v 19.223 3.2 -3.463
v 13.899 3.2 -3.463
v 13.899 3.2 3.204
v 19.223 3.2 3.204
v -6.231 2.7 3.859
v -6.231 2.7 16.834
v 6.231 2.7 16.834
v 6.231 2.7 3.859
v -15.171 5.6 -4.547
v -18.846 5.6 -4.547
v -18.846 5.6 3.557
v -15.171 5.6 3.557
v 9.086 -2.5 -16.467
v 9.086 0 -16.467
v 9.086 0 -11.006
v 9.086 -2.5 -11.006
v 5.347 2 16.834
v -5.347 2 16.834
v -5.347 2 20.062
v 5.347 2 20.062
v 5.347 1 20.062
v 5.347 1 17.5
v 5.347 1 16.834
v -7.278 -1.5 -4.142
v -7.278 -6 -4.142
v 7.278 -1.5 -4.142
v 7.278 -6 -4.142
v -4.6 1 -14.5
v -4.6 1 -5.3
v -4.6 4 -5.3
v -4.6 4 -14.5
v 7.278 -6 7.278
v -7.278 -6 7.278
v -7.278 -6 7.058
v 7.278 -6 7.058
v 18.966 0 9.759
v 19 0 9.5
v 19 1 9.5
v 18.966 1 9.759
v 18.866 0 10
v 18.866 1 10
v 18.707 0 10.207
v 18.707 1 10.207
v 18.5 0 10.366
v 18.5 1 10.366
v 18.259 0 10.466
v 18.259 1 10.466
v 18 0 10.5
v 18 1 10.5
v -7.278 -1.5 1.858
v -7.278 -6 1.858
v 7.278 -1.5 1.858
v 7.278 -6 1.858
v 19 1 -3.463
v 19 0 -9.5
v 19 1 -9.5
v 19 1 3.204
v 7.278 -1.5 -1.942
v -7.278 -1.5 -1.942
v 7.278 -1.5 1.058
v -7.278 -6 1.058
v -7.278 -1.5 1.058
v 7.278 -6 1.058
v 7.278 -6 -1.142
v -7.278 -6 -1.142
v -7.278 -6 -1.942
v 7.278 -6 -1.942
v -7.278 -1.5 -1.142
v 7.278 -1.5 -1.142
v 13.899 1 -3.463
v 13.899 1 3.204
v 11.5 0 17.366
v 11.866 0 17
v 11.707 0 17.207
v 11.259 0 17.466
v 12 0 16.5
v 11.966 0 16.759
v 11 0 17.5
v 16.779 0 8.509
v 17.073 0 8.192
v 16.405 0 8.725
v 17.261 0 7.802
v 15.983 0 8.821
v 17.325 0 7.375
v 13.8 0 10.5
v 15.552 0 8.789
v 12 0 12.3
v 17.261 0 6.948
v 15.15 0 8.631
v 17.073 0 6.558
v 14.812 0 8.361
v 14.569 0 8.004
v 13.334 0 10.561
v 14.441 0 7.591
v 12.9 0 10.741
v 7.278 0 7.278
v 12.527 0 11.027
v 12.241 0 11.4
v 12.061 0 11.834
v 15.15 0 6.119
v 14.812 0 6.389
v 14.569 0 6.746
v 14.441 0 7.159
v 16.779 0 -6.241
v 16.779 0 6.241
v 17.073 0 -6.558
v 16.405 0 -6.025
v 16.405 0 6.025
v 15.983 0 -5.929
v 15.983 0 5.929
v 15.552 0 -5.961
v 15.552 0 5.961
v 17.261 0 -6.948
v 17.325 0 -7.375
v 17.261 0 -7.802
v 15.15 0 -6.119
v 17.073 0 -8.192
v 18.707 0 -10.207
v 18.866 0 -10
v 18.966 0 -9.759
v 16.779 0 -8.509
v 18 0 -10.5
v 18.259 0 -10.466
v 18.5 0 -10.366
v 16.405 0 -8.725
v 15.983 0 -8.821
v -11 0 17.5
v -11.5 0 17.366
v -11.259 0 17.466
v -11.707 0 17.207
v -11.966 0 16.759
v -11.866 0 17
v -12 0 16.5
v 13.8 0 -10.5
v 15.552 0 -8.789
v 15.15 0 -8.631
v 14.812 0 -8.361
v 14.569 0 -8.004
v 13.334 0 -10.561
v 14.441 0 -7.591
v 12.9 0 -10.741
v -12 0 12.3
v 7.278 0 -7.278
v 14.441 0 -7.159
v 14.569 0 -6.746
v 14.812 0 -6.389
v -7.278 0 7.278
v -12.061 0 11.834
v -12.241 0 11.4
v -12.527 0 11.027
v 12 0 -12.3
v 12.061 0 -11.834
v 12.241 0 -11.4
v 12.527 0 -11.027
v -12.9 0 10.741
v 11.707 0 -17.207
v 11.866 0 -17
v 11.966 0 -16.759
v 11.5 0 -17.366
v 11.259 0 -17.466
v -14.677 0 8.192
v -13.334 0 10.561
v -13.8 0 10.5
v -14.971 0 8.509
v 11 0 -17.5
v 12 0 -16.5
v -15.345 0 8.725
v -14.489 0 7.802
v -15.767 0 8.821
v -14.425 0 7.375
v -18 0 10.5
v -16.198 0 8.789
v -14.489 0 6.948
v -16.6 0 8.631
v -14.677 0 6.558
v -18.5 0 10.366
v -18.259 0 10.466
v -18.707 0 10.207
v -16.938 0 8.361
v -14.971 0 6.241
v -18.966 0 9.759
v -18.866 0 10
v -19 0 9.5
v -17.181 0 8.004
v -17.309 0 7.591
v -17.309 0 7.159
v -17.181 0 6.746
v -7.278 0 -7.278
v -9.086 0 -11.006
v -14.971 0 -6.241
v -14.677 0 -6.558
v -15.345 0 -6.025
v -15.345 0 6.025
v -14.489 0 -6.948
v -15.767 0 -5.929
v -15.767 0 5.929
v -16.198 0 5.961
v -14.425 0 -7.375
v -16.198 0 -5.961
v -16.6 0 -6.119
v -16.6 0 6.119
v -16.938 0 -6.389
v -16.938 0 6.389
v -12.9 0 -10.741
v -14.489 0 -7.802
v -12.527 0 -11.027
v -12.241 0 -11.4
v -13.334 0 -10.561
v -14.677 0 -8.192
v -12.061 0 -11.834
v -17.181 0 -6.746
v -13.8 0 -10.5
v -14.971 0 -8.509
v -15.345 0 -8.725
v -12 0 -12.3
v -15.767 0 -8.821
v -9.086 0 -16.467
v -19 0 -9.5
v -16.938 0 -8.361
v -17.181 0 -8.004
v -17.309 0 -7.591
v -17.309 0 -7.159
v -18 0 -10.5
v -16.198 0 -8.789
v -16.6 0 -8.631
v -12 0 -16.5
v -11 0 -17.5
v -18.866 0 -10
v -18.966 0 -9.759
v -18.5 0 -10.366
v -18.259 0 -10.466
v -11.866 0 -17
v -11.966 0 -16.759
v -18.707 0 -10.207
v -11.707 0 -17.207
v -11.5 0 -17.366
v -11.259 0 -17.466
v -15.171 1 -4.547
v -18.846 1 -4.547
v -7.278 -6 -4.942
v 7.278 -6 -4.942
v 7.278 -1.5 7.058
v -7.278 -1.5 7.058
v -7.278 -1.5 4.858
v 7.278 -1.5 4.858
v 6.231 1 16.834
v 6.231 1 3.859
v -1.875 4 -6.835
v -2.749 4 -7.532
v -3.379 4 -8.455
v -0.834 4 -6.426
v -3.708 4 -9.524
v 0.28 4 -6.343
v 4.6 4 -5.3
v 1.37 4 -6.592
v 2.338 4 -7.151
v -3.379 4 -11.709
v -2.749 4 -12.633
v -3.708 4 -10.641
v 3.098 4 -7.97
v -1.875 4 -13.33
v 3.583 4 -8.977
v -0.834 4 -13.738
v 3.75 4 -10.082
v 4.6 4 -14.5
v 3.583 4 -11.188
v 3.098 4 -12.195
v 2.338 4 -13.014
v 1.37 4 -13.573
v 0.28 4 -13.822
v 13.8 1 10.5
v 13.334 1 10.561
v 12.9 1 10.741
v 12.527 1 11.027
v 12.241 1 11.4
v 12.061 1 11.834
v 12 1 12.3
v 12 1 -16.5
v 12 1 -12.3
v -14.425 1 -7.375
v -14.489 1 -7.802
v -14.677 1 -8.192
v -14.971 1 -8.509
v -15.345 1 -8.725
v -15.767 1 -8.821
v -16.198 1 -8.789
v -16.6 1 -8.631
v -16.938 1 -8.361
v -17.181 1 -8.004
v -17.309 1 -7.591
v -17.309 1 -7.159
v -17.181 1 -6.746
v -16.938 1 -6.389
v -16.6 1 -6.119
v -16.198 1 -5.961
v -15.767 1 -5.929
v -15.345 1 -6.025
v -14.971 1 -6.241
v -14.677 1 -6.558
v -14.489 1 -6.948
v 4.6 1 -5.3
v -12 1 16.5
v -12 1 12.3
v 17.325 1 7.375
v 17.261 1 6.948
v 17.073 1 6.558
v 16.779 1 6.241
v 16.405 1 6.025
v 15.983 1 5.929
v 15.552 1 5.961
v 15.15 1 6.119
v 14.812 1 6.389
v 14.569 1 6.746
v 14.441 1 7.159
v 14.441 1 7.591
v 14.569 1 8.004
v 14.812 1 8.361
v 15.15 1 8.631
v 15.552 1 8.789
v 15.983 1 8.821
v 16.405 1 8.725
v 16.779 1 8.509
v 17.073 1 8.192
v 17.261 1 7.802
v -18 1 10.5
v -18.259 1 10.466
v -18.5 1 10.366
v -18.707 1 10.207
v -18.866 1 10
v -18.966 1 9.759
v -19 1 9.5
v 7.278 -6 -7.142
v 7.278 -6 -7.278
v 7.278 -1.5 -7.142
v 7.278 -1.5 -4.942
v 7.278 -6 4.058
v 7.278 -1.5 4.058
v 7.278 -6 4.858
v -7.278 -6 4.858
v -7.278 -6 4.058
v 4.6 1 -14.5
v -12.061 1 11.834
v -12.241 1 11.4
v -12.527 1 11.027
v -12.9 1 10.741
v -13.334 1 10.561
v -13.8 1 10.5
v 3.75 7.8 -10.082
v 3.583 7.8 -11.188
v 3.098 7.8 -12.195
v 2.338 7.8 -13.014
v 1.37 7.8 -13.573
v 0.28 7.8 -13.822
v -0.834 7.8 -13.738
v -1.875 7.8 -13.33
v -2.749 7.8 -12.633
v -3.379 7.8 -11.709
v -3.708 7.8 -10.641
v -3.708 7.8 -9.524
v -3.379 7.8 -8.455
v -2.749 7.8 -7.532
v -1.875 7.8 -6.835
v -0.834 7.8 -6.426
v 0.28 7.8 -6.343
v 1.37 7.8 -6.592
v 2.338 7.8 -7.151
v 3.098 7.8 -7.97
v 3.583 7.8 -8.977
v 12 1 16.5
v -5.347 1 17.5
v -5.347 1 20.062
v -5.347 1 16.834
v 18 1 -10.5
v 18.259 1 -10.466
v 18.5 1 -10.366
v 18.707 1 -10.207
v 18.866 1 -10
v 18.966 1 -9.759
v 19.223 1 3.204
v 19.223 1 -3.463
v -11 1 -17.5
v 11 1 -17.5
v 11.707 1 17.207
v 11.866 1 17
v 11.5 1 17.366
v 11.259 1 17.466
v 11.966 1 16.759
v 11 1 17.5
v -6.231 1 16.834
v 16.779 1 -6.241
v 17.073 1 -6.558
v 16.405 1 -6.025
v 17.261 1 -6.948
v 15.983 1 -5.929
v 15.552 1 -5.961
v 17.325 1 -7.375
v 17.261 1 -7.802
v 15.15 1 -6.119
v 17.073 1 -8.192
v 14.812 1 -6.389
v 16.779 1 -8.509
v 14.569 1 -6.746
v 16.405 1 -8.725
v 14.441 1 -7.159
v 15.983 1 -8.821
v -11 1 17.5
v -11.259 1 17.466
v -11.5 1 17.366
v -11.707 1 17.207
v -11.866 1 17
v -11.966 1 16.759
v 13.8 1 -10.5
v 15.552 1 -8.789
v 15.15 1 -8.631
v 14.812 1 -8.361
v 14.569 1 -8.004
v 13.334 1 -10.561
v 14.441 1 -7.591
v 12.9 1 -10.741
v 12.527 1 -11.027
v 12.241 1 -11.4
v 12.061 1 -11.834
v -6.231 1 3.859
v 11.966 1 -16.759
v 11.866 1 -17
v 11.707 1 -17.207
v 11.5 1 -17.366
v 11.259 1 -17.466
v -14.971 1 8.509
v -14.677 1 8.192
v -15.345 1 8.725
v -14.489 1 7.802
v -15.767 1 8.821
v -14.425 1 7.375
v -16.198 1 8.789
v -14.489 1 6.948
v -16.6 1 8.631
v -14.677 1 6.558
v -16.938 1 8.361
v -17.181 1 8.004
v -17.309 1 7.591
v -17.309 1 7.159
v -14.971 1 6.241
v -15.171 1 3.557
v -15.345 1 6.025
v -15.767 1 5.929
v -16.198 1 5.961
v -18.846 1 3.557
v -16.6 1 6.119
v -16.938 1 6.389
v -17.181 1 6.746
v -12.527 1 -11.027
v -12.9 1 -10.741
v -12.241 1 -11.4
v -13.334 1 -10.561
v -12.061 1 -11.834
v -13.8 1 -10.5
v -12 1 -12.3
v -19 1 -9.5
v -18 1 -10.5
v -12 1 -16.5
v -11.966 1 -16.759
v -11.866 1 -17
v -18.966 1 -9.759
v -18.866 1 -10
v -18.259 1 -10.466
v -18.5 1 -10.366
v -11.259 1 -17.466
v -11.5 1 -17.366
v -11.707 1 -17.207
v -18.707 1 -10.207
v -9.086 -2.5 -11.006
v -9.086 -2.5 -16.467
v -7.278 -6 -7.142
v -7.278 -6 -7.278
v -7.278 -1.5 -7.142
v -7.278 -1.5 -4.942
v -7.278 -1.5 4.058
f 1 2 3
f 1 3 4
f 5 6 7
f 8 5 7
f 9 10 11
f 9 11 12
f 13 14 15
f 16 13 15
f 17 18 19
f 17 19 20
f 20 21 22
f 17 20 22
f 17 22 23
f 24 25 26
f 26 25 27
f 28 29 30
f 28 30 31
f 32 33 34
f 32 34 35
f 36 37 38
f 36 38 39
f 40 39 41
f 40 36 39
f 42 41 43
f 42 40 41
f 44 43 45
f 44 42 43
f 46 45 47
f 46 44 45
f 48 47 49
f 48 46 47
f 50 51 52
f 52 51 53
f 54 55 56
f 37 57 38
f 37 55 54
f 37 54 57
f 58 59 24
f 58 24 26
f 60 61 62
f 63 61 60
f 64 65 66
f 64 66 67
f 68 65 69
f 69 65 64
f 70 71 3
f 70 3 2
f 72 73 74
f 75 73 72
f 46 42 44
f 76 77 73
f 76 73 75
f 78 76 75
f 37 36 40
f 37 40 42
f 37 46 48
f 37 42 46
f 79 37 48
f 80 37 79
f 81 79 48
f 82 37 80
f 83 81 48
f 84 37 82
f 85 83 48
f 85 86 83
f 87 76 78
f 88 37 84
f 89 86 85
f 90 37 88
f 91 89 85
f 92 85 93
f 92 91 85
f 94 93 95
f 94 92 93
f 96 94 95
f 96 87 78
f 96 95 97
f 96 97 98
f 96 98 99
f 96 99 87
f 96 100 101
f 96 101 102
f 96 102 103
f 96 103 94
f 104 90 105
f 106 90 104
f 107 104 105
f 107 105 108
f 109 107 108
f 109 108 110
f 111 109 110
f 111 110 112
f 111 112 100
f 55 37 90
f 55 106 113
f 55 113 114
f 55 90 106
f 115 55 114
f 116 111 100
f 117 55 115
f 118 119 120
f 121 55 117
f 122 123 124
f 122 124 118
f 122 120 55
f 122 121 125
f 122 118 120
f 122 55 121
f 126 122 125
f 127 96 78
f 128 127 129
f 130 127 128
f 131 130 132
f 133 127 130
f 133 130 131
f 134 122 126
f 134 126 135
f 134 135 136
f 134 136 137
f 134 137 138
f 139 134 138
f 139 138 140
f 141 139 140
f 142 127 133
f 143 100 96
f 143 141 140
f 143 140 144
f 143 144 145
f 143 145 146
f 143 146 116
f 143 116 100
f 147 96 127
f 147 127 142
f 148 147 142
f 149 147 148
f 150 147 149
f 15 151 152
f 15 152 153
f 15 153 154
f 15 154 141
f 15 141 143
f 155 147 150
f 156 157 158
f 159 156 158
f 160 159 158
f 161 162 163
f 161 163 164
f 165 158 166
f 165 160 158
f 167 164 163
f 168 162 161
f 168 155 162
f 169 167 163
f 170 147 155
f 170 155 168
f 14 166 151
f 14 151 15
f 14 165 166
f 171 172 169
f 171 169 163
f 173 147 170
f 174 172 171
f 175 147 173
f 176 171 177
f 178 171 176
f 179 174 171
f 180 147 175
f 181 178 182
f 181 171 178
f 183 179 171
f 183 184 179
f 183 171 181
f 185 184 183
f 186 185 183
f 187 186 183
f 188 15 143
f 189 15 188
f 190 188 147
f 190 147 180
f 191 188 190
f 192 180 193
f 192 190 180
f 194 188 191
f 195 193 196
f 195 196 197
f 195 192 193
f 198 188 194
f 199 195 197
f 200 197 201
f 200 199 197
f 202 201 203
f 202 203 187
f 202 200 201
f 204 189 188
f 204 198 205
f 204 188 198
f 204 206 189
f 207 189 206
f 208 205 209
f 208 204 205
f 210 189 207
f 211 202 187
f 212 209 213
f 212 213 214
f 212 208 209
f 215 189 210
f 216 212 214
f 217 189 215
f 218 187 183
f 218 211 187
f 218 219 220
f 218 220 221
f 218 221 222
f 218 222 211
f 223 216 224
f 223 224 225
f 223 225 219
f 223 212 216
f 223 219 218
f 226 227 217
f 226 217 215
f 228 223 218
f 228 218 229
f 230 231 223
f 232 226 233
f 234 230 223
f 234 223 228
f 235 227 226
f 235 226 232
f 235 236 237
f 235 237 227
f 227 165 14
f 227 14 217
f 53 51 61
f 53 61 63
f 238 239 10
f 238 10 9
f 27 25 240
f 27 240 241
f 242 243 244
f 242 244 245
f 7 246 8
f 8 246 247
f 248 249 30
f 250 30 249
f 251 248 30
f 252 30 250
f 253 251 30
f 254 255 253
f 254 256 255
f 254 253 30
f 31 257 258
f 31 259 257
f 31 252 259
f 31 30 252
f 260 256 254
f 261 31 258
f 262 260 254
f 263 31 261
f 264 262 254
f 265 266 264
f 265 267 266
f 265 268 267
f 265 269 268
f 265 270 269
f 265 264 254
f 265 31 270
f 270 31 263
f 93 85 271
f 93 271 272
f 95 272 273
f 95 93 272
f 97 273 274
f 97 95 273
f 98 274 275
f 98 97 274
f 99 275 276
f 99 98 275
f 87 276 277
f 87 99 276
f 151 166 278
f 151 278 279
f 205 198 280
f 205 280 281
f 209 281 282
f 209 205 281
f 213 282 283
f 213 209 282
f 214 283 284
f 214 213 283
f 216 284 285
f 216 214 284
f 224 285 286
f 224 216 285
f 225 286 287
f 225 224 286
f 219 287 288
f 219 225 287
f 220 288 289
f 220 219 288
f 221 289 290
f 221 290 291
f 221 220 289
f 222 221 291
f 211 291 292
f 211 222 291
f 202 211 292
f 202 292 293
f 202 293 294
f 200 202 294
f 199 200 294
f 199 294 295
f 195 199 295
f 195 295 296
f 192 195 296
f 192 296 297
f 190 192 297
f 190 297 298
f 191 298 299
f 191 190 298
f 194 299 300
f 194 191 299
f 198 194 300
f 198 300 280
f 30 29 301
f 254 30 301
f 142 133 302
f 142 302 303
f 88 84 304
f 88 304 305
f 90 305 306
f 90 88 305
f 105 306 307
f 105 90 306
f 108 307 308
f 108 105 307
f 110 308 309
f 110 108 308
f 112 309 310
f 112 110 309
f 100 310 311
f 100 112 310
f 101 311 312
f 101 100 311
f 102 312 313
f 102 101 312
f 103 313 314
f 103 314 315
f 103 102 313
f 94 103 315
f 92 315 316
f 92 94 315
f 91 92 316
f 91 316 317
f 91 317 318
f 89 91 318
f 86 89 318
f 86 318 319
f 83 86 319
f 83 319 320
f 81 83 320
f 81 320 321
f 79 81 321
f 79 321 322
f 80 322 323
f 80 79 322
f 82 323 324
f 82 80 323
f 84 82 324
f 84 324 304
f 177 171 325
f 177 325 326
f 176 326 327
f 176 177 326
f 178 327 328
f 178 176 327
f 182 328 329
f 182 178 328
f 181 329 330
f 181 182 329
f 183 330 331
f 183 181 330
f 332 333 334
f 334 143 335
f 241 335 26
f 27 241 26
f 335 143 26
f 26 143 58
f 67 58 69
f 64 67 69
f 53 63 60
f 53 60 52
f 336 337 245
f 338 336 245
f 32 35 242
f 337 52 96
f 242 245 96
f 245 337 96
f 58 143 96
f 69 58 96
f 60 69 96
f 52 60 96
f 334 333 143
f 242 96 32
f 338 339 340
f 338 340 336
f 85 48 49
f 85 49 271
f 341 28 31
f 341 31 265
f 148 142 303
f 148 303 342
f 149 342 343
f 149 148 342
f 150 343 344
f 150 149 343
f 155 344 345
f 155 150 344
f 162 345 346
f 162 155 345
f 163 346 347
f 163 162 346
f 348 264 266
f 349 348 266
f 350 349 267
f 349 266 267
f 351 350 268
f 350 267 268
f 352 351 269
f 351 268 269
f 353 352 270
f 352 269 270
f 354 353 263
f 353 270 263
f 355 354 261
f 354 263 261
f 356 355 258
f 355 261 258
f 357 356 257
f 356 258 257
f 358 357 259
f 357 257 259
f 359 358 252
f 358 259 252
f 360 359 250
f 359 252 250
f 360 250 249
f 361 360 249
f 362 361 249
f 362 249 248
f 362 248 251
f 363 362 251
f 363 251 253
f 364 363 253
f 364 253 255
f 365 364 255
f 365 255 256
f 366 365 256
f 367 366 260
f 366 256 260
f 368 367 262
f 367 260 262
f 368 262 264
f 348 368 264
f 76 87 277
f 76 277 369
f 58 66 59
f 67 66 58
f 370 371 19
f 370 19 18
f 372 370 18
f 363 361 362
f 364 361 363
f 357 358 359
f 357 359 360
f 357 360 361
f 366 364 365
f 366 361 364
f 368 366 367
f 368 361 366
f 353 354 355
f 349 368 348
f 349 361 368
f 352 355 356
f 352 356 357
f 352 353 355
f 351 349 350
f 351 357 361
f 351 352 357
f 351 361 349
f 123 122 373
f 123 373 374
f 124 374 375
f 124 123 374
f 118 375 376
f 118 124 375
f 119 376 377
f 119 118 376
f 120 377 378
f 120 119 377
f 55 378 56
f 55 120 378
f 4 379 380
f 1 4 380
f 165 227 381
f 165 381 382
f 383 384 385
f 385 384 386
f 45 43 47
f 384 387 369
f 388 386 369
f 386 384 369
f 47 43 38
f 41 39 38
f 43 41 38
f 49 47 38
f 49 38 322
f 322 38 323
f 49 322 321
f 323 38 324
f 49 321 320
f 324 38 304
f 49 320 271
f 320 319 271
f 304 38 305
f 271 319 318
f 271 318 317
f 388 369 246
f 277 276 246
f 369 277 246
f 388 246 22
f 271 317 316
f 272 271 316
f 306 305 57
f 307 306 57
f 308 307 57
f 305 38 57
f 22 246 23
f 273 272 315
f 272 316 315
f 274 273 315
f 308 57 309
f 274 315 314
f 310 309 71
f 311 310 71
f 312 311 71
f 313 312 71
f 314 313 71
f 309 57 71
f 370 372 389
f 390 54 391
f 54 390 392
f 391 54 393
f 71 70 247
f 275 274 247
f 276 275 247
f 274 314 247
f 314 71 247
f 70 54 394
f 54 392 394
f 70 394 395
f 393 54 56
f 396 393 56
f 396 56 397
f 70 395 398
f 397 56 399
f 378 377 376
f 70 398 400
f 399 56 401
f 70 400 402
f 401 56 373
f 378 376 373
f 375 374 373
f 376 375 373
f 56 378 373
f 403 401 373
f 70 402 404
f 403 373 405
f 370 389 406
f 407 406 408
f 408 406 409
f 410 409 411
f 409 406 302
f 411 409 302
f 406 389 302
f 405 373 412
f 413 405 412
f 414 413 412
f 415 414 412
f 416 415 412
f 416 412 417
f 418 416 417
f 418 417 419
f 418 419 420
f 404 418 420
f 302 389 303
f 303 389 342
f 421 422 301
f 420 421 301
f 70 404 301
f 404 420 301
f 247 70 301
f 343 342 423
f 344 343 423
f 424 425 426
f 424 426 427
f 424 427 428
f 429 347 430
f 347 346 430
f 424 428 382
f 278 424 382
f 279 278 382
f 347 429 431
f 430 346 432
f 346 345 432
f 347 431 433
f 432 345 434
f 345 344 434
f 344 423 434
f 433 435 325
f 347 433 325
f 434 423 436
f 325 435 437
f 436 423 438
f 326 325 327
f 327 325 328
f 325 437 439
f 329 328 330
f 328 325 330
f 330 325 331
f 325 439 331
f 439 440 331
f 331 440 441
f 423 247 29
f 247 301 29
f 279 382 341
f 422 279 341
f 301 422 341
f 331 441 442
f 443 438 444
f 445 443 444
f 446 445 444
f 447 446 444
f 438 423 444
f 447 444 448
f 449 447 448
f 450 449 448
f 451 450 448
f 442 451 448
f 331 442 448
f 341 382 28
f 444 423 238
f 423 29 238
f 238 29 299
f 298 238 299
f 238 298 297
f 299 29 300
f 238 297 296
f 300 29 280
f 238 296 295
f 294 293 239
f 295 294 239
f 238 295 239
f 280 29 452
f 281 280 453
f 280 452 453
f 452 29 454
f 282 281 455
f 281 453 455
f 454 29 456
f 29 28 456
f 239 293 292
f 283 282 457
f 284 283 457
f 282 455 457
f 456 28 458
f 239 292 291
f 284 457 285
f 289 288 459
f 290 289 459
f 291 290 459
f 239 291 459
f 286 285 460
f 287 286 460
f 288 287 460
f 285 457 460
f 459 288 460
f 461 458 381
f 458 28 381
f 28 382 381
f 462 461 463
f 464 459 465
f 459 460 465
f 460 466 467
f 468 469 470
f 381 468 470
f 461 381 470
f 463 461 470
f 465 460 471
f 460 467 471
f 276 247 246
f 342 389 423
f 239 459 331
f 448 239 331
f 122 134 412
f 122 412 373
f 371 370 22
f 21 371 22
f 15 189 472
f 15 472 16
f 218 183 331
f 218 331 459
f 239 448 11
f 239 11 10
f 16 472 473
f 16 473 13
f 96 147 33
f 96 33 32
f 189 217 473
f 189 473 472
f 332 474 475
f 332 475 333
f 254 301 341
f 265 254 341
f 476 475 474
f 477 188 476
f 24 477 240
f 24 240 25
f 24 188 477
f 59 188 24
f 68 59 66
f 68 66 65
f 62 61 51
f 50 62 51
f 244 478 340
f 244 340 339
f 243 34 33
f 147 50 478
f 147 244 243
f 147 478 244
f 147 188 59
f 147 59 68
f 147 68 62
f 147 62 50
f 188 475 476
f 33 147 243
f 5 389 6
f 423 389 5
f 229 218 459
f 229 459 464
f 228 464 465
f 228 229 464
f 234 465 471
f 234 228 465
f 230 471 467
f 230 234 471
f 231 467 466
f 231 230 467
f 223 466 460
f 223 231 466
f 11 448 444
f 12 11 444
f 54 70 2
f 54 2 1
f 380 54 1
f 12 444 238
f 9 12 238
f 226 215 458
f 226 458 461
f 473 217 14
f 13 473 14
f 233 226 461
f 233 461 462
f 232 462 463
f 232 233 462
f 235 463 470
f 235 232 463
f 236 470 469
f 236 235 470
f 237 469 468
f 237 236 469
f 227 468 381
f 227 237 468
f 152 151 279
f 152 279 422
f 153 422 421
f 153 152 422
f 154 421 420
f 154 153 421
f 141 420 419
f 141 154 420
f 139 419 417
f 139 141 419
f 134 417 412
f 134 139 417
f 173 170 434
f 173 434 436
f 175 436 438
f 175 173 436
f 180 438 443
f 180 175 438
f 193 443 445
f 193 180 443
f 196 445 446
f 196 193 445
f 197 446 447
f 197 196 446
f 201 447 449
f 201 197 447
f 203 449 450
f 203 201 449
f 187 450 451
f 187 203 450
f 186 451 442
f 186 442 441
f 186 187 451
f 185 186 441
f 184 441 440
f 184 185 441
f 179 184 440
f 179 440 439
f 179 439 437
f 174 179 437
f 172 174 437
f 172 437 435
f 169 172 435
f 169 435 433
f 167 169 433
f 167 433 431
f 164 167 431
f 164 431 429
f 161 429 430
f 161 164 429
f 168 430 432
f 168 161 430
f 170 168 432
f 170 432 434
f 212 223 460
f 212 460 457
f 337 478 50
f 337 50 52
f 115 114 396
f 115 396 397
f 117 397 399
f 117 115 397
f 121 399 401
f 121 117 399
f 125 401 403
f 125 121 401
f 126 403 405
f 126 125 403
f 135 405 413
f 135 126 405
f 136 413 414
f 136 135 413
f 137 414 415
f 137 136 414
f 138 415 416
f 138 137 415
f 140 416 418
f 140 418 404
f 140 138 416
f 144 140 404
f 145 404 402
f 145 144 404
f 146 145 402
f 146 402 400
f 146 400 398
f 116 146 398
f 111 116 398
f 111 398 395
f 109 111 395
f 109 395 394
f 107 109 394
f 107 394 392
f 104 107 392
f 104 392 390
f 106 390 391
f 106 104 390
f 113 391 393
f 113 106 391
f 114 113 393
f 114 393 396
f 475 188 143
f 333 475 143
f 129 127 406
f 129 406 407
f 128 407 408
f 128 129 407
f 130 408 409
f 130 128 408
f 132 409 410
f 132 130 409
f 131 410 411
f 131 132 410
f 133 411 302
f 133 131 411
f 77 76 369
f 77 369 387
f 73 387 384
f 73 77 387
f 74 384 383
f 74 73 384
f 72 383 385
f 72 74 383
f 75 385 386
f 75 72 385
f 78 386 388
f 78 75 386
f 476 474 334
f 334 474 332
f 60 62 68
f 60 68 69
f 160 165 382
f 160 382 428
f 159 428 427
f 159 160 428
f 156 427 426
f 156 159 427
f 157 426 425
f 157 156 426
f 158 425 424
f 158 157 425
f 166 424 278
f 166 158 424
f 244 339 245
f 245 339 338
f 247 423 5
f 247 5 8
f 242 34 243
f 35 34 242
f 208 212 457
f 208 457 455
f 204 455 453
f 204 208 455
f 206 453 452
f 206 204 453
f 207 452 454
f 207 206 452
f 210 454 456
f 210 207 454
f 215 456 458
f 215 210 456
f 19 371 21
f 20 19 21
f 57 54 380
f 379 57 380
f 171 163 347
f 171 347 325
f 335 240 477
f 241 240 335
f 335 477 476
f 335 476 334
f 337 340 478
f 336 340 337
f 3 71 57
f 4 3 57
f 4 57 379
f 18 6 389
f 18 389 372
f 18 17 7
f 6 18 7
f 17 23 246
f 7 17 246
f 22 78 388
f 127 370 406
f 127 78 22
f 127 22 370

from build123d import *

# Parameters (mm, degrees)
SKETCH_1_R          = 1.45
EXTRUDE_1_DEPTH     = 1
SKETCH_2_W          = 3.674905937
SKETCH_2_H          = 8.103638732
EXTRUDE_2_DEPTH     = 4.6
SKETCH_3_W          = 9.2
SKETCH_3_H          = 9.2
EXTRUDE_3_DEPTH     = 3
SKETCH_4_R          = 3.75
EXTRUDE_4_DEPTH     = 3.8
SKETCH_5_W          = 5.32390219
SKETCH_5_H          = 6.666656283
EXTRUDE_5_DEPTH     = 2.2
SKETCH_6_W          = 12.46284852
SKETCH_6_H          = 12.975244807
EXTRUDE_6_DEPTH     = 1.7
SKETCH_7_W          = 10.69456342
SKETCH_7_H          = 13.354174441
EXTRUDE_7_DEPTH     = 1
SKETCH_8_W          = 14.555394544
SKETCH_8_H          = 14.555394544
EXTRUDE_8_DEPTH     = 6
SKETCH_9_W          = 18.172258066
SKETCH_9_H          = 5.460745639
EXTRUDE_9_DEPTH     = 2.5
SKETCH_10_W         = 17.57536677
SKETCH_10_H         = 2.2
CUT_EXTRUDE_1_DEPTH = 4.5


with BuildPart() as part:
    # 草图1 → 凸台-拉伸1 (new body)
    with BuildSketch(Plane(origin=(0, 0, 0), x_dir=(1, 0, 0), z_dir=(0, 1, 0))):
        with BuildLine():
            Line((-11, 17.5), (11, 17.5))
            ThreePointArc((11, 17.5), (11.707106781, 17.207106781), (12, 16.5))
            Line((12, 16.5), (12, 12.3))
            ThreePointArc((12, 12.3), (12.527207794, 11.027207794), (13.8, 10.5))
            Line((13.8, 10.5), (18, 10.5))
            ThreePointArc((18, 10.5), (18.707106781, 10.207106781), (19, 9.5))
            Line((19, 9.5), (19, -9.5))
            ThreePointArc((19, -9.5), (18.707106781, -10.207106781), (18, -10.5))
            Line((18, -10.5), (13.8, -10.5))
            ThreePointArc((13.8, -10.5), (12.527207794, -11.027207794), (12, -12.3))
            Line((12, -12.3), (12, -16.5))
            ThreePointArc((12, -16.5), (11.707106781, -17.207106781), (11, -17.5))
            Line((11, -17.5), (-11, -17.5))
            ThreePointArc((-11, -17.5), (-11.707106781, -17.207106781), (-12, -16.5))
            Line((-12, -16.5), (-12, -12.3))
            ThreePointArc((-12, -12.3), (-12.527207794, -11.027207794), (-13.8, -10.5))
            Line((-13.8, -10.5), (-18, -10.5))
            ThreePointArc((-18, -10.5), (-18.707106781, -10.207106781), (-19, -9.5))
            Line((-19, -9.5), (-19, 9.5))
            ThreePointArc((-19, 9.5), (-18.707106781, 10.207106781), (-18, 10.5))
            Line((-18, 10.5), (-13.8, 10.5))
            ThreePointArc((-13.8, 10.5), (-12.527207794, 11.027207794), (-12, 12.3))
            Line((-12, 12.3), (-12, 16.5))
            ThreePointArc((-12, 16.5), (-11.707106781, 17.207106781), (-11, 17.5))
        make_face()
        with Locations((15.875, 7.375)):
            Circle(SKETCH_1_R, mode=Mode.SUBTRACT)
        with Locations((15.875, -7.375)):
            Circle(SKETCH_1_R, mode=Mode.SUBTRACT)
        with Locations((-15.875, -7.375)):
            Circle(SKETCH_1_R, mode=Mode.SUBTRACT)
        with Locations((-15.875, 7.375)):
            Circle(SKETCH_1_R, mode=Mode.SUBTRACT)
    extrude(amount=EXTRUDE_1_DEPTH)

    # 草图2 → 凸台-拉伸2 (add)
    with BuildSketch(Plane(origin=(0, 1, 0), x_dir=(1, 0, 0), z_dir=(0, 1, 0))):
        with Locations((-17.008218503, 0.494698876)):
            Rectangle(SKETCH_2_W, SKETCH_2_H)
    extrude(amount=EXTRUDE_2_DEPTH)

    # 草图3 → 凸台-拉伸3 (add)
    with BuildSketch(Plane(origin=(0, 1, 0), x_dir=(1, 0, 0), z_dir=(0, 1, 0))):
        with Locations((0, 9.9)):
            Rectangle(SKETCH_3_W, SKETCH_3_H)
    extrude(amount=EXTRUDE_3_DEPTH)

    # 草图4 → 凸台-拉伸4 (add)
    with BuildSketch(Plane(origin=(0, 4, 0), x_dir=(1, 0, 0), z_dir=(0, 1, 0))):
        with Locations((0, 10.082434237)):
            Circle(SKETCH_4_R)
    extrude(amount=EXTRUDE_4_DEPTH)

    # 草图5 → 凸台-拉伸5 (add)
    with BuildSketch(Plane(origin=(0, 1, 0), x_dir=(1, 0, 0), z_dir=(0, 1, 0))):
        with Locations((16.560633805, 0.129563992)):
            Rectangle(SKETCH_5_W, SKETCH_5_H)
    extrude(amount=EXTRUDE_5_DEPTH)

    # 草图6 → 凸台-拉伸6 (add)
    with BuildSketch(Plane(origin=(0, 1, 0), x_dir=(1, 0, 0), z_dir=(0, 1, 0))):
        with Locations((0, -10.346273638)):
            Rectangle(SKETCH_6_W, SKETCH_6_H)
    extrude(amount=EXTRUDE_6_DEPTH)

    # 草图7 → 凸台-拉伸7 (add)
    with BuildSketch(Plane(origin=(0, 1, 0), x_dir=(1, 0, 0), z_dir=(0, 1, 0))):
        with Locations((0, -13.384558474)):
            Rectangle(SKETCH_7_W, SKETCH_7_H)
    extrude(amount=EXTRUDE_7_DEPTH)

    # 草图8 → 凸台-拉伸8 (add)
    with BuildSketch(Plane.XZ):
        Rectangle(SKETCH_8_W, SKETCH_8_H)
    extrude(amount=EXTRUDE_8_DEPTH)

    # 草图9 → 凸台-拉伸9 (add)
    with BuildSketch(Plane.XZ):
        with Locations((0, -13.73622766)):
            Rectangle(SKETCH_9_W, SKETCH_9_H)
    extrude(amount=EXTRUDE_9_DEPTH)

    # 草图10 → 切除-拉伸1 (cut)
    with BuildSketch(Plane.XZ.offset(6)):
        with Locations((-0.008749504, 5.958042987)):
            Rectangle(SKETCH_10_W, SKETCH_10_H)
        with Locations((-0.008749504, 2.958042987)):
            Rectangle(SKETCH_10_W, SKETCH_10_H)
        with Locations((-0.008749504, -0.041957013)):
            Rectangle(SKETCH_10_W, SKETCH_10_H)
        with Locations((-0.008749504, -3.041957013)):
            Rectangle(SKETCH_10_W, SKETCH_10_H)
        with Locations((-0.008749504, -6.041957013)):
            Rectangle(SKETCH_10_W, SKETCH_10_H)
    extrude(amount=-CUT_EXTRUDE_1_DEPTH, mode=Mode.SUBTRACT)


solid = part.part
